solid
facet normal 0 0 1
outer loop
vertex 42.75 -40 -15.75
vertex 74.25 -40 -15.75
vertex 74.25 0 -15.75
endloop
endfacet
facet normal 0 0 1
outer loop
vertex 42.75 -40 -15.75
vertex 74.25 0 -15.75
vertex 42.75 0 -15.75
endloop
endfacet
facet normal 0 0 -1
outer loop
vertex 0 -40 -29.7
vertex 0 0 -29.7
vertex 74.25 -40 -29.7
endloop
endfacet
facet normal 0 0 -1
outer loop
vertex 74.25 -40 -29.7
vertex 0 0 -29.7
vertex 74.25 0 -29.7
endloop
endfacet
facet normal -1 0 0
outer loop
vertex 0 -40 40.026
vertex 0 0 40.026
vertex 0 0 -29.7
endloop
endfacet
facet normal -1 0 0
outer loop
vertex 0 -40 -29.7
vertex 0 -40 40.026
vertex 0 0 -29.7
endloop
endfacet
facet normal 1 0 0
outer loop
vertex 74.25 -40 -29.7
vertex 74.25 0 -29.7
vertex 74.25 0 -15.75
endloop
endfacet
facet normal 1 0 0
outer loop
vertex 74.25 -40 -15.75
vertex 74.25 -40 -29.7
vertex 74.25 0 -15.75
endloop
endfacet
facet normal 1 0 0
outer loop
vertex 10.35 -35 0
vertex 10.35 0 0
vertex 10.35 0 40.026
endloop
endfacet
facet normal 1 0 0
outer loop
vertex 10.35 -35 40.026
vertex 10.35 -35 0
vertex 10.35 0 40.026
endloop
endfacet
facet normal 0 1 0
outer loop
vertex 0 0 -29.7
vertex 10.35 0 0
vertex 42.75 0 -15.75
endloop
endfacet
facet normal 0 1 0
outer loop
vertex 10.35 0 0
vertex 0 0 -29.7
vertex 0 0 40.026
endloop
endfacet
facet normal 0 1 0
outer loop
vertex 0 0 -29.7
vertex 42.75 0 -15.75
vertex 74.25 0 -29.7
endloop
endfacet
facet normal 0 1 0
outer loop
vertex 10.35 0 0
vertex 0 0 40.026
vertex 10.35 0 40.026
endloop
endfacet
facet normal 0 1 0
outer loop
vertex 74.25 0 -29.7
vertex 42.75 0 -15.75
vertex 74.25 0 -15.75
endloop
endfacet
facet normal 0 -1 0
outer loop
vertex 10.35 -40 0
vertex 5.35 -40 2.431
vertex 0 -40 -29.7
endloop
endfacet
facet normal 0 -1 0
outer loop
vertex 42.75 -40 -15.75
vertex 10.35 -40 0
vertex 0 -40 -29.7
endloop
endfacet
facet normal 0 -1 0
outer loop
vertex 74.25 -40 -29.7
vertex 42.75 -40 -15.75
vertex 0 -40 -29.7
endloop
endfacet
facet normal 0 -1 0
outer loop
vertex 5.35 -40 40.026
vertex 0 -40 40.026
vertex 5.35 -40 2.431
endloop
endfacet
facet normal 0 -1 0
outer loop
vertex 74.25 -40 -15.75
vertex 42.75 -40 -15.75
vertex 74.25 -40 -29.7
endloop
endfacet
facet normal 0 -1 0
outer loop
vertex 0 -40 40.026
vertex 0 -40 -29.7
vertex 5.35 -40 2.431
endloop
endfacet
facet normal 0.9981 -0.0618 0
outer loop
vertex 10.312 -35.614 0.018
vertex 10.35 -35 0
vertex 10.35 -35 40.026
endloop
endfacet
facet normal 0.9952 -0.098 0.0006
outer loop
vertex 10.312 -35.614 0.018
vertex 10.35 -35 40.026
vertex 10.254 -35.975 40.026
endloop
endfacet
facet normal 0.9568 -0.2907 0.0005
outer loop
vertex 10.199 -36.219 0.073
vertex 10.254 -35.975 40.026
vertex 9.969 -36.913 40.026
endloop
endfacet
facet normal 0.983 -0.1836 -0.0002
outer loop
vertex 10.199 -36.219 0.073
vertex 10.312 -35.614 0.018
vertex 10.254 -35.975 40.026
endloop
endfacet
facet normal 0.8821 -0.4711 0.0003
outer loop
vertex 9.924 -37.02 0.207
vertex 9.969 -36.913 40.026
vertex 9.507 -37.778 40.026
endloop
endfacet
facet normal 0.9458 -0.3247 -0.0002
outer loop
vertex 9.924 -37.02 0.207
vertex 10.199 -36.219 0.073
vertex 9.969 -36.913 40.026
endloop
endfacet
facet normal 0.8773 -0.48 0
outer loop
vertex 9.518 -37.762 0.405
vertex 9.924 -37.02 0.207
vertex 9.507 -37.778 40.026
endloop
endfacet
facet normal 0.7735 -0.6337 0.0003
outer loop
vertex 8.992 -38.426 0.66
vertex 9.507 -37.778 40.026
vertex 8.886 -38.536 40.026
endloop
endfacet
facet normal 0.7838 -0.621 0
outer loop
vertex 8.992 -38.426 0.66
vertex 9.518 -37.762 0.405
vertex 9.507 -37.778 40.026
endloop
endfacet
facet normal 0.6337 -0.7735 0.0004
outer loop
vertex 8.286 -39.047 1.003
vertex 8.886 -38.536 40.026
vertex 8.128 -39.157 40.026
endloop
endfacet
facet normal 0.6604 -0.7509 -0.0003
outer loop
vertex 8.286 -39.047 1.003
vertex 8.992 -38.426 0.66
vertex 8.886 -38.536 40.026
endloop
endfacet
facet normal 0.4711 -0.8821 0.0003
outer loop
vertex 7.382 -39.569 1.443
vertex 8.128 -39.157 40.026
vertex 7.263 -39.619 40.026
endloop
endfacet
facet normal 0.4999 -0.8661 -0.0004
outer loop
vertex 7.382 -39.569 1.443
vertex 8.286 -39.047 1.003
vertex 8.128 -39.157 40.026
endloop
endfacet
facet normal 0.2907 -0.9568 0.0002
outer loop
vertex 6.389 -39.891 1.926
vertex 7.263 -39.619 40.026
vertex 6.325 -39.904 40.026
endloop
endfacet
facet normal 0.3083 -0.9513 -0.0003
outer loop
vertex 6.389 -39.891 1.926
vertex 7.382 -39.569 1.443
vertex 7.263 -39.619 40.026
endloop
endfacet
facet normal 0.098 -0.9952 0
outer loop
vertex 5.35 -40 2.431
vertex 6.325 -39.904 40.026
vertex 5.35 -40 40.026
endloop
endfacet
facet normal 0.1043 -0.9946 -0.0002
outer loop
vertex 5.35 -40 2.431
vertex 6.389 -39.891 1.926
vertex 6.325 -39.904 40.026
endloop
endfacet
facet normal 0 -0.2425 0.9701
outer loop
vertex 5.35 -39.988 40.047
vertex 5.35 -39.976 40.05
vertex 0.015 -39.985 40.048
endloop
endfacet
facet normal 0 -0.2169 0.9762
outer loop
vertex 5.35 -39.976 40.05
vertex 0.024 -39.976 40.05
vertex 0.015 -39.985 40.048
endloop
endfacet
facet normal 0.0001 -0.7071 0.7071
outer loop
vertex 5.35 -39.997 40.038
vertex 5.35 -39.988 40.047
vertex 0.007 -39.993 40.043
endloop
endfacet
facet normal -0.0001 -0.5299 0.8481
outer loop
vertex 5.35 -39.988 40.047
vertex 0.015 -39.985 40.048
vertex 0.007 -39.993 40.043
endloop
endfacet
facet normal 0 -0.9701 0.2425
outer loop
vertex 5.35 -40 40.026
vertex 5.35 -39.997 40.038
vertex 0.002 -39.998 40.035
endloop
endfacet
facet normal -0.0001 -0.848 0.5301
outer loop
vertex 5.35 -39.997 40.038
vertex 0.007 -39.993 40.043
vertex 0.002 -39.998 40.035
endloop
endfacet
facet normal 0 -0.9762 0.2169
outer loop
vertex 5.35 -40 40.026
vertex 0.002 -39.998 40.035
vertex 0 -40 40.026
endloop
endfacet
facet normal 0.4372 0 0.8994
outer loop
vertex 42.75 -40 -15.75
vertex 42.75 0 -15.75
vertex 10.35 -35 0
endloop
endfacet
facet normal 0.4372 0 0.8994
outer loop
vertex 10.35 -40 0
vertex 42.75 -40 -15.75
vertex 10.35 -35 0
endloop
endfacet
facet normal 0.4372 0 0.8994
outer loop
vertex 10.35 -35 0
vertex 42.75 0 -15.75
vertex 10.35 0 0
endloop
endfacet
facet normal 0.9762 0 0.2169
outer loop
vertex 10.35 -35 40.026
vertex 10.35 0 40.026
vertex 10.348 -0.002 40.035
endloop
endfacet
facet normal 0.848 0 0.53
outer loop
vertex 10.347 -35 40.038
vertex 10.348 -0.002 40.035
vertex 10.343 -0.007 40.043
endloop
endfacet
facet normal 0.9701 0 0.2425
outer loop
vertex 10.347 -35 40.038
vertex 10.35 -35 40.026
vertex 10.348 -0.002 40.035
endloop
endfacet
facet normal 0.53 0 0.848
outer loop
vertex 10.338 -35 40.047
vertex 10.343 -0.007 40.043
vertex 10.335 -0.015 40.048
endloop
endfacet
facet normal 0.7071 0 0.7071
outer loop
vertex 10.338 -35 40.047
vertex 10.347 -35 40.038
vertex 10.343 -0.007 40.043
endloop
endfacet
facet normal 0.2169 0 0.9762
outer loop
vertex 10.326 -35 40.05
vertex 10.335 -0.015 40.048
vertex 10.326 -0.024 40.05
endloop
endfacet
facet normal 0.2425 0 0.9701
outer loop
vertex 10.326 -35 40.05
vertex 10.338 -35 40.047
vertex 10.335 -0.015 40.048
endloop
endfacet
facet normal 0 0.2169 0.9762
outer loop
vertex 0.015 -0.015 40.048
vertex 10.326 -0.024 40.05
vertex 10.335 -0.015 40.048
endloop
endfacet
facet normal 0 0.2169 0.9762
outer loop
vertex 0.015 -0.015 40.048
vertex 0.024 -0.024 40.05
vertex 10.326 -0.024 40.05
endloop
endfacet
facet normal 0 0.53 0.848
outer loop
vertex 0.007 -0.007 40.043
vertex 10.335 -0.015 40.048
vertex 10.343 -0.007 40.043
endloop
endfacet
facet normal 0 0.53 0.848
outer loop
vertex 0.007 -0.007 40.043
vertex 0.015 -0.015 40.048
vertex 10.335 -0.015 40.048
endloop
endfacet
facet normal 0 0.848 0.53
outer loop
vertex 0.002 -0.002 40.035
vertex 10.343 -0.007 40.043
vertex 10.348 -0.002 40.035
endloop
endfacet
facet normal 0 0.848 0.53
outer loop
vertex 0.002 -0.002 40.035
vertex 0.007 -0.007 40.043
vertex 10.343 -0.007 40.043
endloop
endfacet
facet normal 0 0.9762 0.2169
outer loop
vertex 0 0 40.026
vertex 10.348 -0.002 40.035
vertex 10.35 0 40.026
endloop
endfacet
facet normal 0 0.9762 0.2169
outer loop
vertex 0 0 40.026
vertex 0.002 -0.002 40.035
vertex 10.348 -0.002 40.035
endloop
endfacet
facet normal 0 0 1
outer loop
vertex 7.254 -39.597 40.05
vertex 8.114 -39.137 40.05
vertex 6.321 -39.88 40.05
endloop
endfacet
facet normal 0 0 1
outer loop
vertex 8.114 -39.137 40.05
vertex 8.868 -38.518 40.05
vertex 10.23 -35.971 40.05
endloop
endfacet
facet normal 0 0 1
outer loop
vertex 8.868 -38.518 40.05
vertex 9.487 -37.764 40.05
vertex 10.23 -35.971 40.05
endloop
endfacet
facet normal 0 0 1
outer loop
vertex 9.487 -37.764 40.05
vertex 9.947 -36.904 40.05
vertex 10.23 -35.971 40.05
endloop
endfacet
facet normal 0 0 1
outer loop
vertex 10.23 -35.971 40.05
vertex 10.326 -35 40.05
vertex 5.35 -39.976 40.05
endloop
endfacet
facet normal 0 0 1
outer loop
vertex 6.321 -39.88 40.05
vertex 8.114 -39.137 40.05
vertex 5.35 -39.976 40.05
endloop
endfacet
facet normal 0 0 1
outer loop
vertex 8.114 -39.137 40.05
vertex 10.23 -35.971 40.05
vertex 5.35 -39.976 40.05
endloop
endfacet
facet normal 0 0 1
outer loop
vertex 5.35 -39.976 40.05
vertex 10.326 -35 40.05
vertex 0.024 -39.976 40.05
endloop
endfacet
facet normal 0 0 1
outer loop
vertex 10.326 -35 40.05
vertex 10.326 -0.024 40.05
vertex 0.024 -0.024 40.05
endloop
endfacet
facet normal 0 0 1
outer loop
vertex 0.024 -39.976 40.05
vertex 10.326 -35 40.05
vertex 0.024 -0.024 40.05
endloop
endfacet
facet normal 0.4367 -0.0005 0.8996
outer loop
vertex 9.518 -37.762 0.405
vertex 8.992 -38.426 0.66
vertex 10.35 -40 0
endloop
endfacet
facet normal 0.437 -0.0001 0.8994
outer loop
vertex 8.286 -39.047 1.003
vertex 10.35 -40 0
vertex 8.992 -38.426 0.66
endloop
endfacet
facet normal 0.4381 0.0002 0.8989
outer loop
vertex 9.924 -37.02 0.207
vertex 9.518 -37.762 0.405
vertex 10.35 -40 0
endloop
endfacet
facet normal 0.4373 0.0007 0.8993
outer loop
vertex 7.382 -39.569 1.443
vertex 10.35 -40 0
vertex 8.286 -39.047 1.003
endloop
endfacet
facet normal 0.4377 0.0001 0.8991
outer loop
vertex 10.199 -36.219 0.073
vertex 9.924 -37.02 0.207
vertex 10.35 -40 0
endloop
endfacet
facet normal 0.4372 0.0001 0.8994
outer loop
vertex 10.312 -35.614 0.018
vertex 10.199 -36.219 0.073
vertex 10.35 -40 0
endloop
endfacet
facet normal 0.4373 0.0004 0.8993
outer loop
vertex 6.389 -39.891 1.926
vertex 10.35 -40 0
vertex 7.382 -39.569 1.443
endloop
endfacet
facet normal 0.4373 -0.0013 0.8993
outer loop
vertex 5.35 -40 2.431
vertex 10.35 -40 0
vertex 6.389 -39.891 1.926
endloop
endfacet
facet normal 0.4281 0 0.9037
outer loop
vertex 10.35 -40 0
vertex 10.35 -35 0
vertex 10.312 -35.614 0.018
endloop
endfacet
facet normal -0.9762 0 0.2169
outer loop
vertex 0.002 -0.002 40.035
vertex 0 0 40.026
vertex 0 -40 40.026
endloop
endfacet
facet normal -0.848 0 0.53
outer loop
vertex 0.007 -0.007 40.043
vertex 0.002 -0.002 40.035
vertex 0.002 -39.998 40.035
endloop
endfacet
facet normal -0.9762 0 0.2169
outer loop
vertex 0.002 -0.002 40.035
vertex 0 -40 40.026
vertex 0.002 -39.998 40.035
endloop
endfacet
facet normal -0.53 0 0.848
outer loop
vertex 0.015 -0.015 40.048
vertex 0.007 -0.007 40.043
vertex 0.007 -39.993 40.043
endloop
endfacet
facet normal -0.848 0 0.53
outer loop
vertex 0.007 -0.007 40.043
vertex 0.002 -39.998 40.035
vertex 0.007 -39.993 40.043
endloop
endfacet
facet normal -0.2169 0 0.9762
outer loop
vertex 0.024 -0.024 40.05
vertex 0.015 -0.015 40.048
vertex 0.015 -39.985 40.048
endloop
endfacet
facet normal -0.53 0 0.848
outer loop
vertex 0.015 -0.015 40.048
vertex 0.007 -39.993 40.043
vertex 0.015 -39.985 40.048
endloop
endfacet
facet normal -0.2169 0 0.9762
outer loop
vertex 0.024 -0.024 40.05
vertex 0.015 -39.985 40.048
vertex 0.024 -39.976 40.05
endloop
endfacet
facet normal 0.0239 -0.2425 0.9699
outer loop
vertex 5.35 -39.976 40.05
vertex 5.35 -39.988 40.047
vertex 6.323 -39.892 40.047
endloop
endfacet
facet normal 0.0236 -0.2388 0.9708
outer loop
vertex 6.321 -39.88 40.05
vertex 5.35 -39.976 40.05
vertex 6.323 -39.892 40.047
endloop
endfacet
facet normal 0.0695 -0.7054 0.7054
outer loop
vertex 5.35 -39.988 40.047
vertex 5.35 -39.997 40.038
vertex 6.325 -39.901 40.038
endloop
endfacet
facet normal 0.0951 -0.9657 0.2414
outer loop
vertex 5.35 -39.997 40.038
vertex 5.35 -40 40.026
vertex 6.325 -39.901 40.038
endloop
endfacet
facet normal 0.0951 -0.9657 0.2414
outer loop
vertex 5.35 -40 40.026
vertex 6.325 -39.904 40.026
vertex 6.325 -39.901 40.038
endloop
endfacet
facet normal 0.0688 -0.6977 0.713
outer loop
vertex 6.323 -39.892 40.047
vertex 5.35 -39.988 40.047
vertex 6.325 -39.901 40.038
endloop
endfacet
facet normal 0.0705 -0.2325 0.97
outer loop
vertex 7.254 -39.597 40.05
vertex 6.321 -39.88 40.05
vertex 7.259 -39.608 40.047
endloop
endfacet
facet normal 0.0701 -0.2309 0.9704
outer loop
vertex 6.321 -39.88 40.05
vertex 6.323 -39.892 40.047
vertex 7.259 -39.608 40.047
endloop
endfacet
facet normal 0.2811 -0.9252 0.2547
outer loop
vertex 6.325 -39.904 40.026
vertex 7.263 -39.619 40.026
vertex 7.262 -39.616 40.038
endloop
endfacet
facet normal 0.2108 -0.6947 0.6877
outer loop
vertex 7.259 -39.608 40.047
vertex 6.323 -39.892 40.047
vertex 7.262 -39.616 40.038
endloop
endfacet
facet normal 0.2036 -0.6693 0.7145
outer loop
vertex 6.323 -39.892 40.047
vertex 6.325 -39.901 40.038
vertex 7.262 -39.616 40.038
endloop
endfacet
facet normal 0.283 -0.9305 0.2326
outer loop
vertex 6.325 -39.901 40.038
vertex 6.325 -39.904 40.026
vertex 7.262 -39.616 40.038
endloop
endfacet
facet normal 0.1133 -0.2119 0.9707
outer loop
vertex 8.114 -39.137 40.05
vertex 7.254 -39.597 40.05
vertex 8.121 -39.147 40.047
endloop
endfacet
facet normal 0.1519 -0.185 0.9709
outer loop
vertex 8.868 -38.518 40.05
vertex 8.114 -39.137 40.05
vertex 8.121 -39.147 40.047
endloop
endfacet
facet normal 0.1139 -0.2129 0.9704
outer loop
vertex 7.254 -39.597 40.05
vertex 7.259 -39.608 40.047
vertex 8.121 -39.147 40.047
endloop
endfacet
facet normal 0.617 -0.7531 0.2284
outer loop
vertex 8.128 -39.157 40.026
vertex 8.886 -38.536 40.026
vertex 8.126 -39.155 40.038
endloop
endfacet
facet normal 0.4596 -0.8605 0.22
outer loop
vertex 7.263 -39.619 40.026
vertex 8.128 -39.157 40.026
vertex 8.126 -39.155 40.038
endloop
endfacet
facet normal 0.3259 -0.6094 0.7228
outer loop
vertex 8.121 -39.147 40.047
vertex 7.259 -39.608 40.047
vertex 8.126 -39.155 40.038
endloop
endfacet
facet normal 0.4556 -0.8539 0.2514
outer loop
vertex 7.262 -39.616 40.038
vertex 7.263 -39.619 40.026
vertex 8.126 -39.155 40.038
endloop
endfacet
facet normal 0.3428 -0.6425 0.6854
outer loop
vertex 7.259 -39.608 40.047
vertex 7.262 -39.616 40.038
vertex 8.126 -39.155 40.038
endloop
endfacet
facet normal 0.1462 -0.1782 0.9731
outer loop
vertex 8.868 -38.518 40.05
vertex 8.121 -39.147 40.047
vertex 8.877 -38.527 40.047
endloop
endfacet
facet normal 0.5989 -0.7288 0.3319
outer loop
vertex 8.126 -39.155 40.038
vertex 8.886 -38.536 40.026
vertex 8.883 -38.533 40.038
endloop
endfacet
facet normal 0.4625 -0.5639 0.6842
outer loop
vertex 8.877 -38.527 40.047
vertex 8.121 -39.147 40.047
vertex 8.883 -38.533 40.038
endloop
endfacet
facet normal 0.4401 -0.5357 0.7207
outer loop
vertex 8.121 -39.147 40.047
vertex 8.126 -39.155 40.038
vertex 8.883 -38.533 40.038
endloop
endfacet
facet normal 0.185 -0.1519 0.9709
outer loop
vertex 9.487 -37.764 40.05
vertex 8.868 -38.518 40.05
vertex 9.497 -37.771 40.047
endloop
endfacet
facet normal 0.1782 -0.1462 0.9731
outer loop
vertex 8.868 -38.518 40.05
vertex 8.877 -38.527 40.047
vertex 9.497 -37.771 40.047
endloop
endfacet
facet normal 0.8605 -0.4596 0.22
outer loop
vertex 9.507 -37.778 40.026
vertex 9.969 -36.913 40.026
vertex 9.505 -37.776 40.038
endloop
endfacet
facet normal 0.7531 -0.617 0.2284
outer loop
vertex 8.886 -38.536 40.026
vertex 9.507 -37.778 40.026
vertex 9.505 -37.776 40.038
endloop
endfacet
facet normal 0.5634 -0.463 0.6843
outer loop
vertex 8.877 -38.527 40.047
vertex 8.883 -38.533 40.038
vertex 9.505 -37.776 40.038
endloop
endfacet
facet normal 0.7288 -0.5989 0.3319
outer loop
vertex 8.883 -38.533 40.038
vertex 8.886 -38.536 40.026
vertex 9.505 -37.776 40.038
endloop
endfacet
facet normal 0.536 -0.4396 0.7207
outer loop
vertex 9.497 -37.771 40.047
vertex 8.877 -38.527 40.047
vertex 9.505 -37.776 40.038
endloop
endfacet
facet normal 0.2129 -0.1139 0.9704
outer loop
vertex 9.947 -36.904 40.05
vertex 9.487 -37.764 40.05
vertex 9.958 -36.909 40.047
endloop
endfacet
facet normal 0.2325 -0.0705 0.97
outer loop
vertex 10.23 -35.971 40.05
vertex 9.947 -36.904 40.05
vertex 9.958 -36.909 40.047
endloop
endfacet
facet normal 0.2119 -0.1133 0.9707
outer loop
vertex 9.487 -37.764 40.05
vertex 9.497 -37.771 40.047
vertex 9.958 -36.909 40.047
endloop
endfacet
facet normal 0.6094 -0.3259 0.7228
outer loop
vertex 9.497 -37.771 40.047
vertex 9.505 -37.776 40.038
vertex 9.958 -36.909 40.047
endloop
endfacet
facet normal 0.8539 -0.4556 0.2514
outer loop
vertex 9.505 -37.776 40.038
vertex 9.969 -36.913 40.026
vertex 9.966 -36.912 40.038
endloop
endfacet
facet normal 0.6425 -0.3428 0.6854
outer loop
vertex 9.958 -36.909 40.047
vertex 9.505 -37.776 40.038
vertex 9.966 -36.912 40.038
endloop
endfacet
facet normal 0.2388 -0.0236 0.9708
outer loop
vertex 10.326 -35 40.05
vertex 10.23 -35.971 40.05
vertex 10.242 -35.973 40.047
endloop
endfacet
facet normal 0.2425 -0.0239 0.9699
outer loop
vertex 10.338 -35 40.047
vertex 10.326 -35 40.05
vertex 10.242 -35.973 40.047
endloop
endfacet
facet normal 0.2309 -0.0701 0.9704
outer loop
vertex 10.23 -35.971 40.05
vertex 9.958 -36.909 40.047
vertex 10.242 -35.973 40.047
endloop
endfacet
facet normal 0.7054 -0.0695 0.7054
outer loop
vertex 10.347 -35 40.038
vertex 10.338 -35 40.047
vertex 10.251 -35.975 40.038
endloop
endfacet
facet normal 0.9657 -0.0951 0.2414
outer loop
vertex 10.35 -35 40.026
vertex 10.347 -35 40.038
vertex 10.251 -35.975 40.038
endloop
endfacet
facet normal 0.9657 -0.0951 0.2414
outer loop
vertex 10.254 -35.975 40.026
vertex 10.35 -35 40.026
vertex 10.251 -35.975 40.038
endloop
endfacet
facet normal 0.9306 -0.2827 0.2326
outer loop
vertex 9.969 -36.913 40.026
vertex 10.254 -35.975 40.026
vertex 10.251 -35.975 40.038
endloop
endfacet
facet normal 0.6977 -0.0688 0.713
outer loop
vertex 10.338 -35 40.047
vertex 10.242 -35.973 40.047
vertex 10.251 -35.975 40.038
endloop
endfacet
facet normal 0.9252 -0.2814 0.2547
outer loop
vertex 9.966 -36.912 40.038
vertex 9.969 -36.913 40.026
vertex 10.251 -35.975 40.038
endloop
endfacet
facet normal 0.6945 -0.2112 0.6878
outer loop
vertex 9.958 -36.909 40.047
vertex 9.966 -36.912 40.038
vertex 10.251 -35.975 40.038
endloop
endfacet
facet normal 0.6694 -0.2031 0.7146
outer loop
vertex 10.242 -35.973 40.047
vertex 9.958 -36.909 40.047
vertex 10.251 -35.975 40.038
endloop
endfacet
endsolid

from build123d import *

# Parameters (mm, degrees)
F1_DEPTH    = 40
F2_R        = 0.0241421356
F3_T2_ANGLE = 90
F3_T6_DEPTH = 52.5499999523


# Not quite as in the source:
# - a fillet or chamfer that OpenCascade refuses, or shapes differently, is made with other operations: its cross-section is extruded or revolved along the edge and cut away or added


with BuildPart() as f1:
    # F0 (on Front) → F1 (new body)
    with BuildSketch(Plane.XZ):
        Polygon((0, 40.0499999523), (0, 0), (0, -29.6999998391), (74.2500051856, -29.6999998391), (74.2500051856, -15.7500002533), (42.7500009537, -15.7500002533), (10.349996388, 0), (10.349996388, 40.0499999523), align=None)
    extrude(amount=F1_DEPTH)

    # F2
    f2_edges = [f1.edges().sort_by_distance(p)[0] for p in [
        (10.349996, -20, 40.05),
        (0, -20, 40.05),
        (5.174998, 0, 40.05),
        (5.174998, -40, 40.05),
    ]]
    fillet(f2_edges, radius=F2_R)

    # F3: fillet of radius 5 on 5 edges, made by hand

    # F3_s1 → F3_t2 (revolve, cut)
    with BuildSketch(Plane.YZ.offset(5.349996388)):
        with BuildLine():
            ThreePointArc((-39.9758578644, 40.0499999523), (-39.9929289322, 40.0429288845), (-40, 40.0258578167))
            Line((-40, 40.0258578167), (-40, 40.0499999523))
            Line((-40, 40.0499999523), (-39.9758578644, 40.0499999523))
        make_face()
    revolve(axis=Axis((5.349996388, -35, 40.0499999523), (0, 0, 1)), revolution_arc=F3_T2_ANGLE, mode=Mode.SUBTRACT)


with BuildPart() as f3_tool4:
    # F3_s5 → F3_t6 (new body)
    with BuildSketch(Plane.XY.offset(-12.5)):
        with BuildLine():
            ThreePointArc((10.349996388, -35), (8.8855302939, -38.5355339059), (5.349996388, -40))
            Line((5.349996388, -40), (10.349996388, -40))
            Line((10.349996388, -40), (10.349996388, -35))
        make_face()
    extrude(amount=F3_T6_DEPTH)

    split(bisect_by=Plane(origin=(1.9782716516, 0, 4.0695879055), x_dir=(0, 1, 0), z_dir=(0.4371926627, 0, 0.8993678756)), keep=Keep.TOP)


with BuildPart() as f1_1:
    add(f1.part)

    # F3_t3: cut F3_tool4
    add(f3_tool4.part, mode=Mode.SUBTRACT)


solid = f1_1.part
